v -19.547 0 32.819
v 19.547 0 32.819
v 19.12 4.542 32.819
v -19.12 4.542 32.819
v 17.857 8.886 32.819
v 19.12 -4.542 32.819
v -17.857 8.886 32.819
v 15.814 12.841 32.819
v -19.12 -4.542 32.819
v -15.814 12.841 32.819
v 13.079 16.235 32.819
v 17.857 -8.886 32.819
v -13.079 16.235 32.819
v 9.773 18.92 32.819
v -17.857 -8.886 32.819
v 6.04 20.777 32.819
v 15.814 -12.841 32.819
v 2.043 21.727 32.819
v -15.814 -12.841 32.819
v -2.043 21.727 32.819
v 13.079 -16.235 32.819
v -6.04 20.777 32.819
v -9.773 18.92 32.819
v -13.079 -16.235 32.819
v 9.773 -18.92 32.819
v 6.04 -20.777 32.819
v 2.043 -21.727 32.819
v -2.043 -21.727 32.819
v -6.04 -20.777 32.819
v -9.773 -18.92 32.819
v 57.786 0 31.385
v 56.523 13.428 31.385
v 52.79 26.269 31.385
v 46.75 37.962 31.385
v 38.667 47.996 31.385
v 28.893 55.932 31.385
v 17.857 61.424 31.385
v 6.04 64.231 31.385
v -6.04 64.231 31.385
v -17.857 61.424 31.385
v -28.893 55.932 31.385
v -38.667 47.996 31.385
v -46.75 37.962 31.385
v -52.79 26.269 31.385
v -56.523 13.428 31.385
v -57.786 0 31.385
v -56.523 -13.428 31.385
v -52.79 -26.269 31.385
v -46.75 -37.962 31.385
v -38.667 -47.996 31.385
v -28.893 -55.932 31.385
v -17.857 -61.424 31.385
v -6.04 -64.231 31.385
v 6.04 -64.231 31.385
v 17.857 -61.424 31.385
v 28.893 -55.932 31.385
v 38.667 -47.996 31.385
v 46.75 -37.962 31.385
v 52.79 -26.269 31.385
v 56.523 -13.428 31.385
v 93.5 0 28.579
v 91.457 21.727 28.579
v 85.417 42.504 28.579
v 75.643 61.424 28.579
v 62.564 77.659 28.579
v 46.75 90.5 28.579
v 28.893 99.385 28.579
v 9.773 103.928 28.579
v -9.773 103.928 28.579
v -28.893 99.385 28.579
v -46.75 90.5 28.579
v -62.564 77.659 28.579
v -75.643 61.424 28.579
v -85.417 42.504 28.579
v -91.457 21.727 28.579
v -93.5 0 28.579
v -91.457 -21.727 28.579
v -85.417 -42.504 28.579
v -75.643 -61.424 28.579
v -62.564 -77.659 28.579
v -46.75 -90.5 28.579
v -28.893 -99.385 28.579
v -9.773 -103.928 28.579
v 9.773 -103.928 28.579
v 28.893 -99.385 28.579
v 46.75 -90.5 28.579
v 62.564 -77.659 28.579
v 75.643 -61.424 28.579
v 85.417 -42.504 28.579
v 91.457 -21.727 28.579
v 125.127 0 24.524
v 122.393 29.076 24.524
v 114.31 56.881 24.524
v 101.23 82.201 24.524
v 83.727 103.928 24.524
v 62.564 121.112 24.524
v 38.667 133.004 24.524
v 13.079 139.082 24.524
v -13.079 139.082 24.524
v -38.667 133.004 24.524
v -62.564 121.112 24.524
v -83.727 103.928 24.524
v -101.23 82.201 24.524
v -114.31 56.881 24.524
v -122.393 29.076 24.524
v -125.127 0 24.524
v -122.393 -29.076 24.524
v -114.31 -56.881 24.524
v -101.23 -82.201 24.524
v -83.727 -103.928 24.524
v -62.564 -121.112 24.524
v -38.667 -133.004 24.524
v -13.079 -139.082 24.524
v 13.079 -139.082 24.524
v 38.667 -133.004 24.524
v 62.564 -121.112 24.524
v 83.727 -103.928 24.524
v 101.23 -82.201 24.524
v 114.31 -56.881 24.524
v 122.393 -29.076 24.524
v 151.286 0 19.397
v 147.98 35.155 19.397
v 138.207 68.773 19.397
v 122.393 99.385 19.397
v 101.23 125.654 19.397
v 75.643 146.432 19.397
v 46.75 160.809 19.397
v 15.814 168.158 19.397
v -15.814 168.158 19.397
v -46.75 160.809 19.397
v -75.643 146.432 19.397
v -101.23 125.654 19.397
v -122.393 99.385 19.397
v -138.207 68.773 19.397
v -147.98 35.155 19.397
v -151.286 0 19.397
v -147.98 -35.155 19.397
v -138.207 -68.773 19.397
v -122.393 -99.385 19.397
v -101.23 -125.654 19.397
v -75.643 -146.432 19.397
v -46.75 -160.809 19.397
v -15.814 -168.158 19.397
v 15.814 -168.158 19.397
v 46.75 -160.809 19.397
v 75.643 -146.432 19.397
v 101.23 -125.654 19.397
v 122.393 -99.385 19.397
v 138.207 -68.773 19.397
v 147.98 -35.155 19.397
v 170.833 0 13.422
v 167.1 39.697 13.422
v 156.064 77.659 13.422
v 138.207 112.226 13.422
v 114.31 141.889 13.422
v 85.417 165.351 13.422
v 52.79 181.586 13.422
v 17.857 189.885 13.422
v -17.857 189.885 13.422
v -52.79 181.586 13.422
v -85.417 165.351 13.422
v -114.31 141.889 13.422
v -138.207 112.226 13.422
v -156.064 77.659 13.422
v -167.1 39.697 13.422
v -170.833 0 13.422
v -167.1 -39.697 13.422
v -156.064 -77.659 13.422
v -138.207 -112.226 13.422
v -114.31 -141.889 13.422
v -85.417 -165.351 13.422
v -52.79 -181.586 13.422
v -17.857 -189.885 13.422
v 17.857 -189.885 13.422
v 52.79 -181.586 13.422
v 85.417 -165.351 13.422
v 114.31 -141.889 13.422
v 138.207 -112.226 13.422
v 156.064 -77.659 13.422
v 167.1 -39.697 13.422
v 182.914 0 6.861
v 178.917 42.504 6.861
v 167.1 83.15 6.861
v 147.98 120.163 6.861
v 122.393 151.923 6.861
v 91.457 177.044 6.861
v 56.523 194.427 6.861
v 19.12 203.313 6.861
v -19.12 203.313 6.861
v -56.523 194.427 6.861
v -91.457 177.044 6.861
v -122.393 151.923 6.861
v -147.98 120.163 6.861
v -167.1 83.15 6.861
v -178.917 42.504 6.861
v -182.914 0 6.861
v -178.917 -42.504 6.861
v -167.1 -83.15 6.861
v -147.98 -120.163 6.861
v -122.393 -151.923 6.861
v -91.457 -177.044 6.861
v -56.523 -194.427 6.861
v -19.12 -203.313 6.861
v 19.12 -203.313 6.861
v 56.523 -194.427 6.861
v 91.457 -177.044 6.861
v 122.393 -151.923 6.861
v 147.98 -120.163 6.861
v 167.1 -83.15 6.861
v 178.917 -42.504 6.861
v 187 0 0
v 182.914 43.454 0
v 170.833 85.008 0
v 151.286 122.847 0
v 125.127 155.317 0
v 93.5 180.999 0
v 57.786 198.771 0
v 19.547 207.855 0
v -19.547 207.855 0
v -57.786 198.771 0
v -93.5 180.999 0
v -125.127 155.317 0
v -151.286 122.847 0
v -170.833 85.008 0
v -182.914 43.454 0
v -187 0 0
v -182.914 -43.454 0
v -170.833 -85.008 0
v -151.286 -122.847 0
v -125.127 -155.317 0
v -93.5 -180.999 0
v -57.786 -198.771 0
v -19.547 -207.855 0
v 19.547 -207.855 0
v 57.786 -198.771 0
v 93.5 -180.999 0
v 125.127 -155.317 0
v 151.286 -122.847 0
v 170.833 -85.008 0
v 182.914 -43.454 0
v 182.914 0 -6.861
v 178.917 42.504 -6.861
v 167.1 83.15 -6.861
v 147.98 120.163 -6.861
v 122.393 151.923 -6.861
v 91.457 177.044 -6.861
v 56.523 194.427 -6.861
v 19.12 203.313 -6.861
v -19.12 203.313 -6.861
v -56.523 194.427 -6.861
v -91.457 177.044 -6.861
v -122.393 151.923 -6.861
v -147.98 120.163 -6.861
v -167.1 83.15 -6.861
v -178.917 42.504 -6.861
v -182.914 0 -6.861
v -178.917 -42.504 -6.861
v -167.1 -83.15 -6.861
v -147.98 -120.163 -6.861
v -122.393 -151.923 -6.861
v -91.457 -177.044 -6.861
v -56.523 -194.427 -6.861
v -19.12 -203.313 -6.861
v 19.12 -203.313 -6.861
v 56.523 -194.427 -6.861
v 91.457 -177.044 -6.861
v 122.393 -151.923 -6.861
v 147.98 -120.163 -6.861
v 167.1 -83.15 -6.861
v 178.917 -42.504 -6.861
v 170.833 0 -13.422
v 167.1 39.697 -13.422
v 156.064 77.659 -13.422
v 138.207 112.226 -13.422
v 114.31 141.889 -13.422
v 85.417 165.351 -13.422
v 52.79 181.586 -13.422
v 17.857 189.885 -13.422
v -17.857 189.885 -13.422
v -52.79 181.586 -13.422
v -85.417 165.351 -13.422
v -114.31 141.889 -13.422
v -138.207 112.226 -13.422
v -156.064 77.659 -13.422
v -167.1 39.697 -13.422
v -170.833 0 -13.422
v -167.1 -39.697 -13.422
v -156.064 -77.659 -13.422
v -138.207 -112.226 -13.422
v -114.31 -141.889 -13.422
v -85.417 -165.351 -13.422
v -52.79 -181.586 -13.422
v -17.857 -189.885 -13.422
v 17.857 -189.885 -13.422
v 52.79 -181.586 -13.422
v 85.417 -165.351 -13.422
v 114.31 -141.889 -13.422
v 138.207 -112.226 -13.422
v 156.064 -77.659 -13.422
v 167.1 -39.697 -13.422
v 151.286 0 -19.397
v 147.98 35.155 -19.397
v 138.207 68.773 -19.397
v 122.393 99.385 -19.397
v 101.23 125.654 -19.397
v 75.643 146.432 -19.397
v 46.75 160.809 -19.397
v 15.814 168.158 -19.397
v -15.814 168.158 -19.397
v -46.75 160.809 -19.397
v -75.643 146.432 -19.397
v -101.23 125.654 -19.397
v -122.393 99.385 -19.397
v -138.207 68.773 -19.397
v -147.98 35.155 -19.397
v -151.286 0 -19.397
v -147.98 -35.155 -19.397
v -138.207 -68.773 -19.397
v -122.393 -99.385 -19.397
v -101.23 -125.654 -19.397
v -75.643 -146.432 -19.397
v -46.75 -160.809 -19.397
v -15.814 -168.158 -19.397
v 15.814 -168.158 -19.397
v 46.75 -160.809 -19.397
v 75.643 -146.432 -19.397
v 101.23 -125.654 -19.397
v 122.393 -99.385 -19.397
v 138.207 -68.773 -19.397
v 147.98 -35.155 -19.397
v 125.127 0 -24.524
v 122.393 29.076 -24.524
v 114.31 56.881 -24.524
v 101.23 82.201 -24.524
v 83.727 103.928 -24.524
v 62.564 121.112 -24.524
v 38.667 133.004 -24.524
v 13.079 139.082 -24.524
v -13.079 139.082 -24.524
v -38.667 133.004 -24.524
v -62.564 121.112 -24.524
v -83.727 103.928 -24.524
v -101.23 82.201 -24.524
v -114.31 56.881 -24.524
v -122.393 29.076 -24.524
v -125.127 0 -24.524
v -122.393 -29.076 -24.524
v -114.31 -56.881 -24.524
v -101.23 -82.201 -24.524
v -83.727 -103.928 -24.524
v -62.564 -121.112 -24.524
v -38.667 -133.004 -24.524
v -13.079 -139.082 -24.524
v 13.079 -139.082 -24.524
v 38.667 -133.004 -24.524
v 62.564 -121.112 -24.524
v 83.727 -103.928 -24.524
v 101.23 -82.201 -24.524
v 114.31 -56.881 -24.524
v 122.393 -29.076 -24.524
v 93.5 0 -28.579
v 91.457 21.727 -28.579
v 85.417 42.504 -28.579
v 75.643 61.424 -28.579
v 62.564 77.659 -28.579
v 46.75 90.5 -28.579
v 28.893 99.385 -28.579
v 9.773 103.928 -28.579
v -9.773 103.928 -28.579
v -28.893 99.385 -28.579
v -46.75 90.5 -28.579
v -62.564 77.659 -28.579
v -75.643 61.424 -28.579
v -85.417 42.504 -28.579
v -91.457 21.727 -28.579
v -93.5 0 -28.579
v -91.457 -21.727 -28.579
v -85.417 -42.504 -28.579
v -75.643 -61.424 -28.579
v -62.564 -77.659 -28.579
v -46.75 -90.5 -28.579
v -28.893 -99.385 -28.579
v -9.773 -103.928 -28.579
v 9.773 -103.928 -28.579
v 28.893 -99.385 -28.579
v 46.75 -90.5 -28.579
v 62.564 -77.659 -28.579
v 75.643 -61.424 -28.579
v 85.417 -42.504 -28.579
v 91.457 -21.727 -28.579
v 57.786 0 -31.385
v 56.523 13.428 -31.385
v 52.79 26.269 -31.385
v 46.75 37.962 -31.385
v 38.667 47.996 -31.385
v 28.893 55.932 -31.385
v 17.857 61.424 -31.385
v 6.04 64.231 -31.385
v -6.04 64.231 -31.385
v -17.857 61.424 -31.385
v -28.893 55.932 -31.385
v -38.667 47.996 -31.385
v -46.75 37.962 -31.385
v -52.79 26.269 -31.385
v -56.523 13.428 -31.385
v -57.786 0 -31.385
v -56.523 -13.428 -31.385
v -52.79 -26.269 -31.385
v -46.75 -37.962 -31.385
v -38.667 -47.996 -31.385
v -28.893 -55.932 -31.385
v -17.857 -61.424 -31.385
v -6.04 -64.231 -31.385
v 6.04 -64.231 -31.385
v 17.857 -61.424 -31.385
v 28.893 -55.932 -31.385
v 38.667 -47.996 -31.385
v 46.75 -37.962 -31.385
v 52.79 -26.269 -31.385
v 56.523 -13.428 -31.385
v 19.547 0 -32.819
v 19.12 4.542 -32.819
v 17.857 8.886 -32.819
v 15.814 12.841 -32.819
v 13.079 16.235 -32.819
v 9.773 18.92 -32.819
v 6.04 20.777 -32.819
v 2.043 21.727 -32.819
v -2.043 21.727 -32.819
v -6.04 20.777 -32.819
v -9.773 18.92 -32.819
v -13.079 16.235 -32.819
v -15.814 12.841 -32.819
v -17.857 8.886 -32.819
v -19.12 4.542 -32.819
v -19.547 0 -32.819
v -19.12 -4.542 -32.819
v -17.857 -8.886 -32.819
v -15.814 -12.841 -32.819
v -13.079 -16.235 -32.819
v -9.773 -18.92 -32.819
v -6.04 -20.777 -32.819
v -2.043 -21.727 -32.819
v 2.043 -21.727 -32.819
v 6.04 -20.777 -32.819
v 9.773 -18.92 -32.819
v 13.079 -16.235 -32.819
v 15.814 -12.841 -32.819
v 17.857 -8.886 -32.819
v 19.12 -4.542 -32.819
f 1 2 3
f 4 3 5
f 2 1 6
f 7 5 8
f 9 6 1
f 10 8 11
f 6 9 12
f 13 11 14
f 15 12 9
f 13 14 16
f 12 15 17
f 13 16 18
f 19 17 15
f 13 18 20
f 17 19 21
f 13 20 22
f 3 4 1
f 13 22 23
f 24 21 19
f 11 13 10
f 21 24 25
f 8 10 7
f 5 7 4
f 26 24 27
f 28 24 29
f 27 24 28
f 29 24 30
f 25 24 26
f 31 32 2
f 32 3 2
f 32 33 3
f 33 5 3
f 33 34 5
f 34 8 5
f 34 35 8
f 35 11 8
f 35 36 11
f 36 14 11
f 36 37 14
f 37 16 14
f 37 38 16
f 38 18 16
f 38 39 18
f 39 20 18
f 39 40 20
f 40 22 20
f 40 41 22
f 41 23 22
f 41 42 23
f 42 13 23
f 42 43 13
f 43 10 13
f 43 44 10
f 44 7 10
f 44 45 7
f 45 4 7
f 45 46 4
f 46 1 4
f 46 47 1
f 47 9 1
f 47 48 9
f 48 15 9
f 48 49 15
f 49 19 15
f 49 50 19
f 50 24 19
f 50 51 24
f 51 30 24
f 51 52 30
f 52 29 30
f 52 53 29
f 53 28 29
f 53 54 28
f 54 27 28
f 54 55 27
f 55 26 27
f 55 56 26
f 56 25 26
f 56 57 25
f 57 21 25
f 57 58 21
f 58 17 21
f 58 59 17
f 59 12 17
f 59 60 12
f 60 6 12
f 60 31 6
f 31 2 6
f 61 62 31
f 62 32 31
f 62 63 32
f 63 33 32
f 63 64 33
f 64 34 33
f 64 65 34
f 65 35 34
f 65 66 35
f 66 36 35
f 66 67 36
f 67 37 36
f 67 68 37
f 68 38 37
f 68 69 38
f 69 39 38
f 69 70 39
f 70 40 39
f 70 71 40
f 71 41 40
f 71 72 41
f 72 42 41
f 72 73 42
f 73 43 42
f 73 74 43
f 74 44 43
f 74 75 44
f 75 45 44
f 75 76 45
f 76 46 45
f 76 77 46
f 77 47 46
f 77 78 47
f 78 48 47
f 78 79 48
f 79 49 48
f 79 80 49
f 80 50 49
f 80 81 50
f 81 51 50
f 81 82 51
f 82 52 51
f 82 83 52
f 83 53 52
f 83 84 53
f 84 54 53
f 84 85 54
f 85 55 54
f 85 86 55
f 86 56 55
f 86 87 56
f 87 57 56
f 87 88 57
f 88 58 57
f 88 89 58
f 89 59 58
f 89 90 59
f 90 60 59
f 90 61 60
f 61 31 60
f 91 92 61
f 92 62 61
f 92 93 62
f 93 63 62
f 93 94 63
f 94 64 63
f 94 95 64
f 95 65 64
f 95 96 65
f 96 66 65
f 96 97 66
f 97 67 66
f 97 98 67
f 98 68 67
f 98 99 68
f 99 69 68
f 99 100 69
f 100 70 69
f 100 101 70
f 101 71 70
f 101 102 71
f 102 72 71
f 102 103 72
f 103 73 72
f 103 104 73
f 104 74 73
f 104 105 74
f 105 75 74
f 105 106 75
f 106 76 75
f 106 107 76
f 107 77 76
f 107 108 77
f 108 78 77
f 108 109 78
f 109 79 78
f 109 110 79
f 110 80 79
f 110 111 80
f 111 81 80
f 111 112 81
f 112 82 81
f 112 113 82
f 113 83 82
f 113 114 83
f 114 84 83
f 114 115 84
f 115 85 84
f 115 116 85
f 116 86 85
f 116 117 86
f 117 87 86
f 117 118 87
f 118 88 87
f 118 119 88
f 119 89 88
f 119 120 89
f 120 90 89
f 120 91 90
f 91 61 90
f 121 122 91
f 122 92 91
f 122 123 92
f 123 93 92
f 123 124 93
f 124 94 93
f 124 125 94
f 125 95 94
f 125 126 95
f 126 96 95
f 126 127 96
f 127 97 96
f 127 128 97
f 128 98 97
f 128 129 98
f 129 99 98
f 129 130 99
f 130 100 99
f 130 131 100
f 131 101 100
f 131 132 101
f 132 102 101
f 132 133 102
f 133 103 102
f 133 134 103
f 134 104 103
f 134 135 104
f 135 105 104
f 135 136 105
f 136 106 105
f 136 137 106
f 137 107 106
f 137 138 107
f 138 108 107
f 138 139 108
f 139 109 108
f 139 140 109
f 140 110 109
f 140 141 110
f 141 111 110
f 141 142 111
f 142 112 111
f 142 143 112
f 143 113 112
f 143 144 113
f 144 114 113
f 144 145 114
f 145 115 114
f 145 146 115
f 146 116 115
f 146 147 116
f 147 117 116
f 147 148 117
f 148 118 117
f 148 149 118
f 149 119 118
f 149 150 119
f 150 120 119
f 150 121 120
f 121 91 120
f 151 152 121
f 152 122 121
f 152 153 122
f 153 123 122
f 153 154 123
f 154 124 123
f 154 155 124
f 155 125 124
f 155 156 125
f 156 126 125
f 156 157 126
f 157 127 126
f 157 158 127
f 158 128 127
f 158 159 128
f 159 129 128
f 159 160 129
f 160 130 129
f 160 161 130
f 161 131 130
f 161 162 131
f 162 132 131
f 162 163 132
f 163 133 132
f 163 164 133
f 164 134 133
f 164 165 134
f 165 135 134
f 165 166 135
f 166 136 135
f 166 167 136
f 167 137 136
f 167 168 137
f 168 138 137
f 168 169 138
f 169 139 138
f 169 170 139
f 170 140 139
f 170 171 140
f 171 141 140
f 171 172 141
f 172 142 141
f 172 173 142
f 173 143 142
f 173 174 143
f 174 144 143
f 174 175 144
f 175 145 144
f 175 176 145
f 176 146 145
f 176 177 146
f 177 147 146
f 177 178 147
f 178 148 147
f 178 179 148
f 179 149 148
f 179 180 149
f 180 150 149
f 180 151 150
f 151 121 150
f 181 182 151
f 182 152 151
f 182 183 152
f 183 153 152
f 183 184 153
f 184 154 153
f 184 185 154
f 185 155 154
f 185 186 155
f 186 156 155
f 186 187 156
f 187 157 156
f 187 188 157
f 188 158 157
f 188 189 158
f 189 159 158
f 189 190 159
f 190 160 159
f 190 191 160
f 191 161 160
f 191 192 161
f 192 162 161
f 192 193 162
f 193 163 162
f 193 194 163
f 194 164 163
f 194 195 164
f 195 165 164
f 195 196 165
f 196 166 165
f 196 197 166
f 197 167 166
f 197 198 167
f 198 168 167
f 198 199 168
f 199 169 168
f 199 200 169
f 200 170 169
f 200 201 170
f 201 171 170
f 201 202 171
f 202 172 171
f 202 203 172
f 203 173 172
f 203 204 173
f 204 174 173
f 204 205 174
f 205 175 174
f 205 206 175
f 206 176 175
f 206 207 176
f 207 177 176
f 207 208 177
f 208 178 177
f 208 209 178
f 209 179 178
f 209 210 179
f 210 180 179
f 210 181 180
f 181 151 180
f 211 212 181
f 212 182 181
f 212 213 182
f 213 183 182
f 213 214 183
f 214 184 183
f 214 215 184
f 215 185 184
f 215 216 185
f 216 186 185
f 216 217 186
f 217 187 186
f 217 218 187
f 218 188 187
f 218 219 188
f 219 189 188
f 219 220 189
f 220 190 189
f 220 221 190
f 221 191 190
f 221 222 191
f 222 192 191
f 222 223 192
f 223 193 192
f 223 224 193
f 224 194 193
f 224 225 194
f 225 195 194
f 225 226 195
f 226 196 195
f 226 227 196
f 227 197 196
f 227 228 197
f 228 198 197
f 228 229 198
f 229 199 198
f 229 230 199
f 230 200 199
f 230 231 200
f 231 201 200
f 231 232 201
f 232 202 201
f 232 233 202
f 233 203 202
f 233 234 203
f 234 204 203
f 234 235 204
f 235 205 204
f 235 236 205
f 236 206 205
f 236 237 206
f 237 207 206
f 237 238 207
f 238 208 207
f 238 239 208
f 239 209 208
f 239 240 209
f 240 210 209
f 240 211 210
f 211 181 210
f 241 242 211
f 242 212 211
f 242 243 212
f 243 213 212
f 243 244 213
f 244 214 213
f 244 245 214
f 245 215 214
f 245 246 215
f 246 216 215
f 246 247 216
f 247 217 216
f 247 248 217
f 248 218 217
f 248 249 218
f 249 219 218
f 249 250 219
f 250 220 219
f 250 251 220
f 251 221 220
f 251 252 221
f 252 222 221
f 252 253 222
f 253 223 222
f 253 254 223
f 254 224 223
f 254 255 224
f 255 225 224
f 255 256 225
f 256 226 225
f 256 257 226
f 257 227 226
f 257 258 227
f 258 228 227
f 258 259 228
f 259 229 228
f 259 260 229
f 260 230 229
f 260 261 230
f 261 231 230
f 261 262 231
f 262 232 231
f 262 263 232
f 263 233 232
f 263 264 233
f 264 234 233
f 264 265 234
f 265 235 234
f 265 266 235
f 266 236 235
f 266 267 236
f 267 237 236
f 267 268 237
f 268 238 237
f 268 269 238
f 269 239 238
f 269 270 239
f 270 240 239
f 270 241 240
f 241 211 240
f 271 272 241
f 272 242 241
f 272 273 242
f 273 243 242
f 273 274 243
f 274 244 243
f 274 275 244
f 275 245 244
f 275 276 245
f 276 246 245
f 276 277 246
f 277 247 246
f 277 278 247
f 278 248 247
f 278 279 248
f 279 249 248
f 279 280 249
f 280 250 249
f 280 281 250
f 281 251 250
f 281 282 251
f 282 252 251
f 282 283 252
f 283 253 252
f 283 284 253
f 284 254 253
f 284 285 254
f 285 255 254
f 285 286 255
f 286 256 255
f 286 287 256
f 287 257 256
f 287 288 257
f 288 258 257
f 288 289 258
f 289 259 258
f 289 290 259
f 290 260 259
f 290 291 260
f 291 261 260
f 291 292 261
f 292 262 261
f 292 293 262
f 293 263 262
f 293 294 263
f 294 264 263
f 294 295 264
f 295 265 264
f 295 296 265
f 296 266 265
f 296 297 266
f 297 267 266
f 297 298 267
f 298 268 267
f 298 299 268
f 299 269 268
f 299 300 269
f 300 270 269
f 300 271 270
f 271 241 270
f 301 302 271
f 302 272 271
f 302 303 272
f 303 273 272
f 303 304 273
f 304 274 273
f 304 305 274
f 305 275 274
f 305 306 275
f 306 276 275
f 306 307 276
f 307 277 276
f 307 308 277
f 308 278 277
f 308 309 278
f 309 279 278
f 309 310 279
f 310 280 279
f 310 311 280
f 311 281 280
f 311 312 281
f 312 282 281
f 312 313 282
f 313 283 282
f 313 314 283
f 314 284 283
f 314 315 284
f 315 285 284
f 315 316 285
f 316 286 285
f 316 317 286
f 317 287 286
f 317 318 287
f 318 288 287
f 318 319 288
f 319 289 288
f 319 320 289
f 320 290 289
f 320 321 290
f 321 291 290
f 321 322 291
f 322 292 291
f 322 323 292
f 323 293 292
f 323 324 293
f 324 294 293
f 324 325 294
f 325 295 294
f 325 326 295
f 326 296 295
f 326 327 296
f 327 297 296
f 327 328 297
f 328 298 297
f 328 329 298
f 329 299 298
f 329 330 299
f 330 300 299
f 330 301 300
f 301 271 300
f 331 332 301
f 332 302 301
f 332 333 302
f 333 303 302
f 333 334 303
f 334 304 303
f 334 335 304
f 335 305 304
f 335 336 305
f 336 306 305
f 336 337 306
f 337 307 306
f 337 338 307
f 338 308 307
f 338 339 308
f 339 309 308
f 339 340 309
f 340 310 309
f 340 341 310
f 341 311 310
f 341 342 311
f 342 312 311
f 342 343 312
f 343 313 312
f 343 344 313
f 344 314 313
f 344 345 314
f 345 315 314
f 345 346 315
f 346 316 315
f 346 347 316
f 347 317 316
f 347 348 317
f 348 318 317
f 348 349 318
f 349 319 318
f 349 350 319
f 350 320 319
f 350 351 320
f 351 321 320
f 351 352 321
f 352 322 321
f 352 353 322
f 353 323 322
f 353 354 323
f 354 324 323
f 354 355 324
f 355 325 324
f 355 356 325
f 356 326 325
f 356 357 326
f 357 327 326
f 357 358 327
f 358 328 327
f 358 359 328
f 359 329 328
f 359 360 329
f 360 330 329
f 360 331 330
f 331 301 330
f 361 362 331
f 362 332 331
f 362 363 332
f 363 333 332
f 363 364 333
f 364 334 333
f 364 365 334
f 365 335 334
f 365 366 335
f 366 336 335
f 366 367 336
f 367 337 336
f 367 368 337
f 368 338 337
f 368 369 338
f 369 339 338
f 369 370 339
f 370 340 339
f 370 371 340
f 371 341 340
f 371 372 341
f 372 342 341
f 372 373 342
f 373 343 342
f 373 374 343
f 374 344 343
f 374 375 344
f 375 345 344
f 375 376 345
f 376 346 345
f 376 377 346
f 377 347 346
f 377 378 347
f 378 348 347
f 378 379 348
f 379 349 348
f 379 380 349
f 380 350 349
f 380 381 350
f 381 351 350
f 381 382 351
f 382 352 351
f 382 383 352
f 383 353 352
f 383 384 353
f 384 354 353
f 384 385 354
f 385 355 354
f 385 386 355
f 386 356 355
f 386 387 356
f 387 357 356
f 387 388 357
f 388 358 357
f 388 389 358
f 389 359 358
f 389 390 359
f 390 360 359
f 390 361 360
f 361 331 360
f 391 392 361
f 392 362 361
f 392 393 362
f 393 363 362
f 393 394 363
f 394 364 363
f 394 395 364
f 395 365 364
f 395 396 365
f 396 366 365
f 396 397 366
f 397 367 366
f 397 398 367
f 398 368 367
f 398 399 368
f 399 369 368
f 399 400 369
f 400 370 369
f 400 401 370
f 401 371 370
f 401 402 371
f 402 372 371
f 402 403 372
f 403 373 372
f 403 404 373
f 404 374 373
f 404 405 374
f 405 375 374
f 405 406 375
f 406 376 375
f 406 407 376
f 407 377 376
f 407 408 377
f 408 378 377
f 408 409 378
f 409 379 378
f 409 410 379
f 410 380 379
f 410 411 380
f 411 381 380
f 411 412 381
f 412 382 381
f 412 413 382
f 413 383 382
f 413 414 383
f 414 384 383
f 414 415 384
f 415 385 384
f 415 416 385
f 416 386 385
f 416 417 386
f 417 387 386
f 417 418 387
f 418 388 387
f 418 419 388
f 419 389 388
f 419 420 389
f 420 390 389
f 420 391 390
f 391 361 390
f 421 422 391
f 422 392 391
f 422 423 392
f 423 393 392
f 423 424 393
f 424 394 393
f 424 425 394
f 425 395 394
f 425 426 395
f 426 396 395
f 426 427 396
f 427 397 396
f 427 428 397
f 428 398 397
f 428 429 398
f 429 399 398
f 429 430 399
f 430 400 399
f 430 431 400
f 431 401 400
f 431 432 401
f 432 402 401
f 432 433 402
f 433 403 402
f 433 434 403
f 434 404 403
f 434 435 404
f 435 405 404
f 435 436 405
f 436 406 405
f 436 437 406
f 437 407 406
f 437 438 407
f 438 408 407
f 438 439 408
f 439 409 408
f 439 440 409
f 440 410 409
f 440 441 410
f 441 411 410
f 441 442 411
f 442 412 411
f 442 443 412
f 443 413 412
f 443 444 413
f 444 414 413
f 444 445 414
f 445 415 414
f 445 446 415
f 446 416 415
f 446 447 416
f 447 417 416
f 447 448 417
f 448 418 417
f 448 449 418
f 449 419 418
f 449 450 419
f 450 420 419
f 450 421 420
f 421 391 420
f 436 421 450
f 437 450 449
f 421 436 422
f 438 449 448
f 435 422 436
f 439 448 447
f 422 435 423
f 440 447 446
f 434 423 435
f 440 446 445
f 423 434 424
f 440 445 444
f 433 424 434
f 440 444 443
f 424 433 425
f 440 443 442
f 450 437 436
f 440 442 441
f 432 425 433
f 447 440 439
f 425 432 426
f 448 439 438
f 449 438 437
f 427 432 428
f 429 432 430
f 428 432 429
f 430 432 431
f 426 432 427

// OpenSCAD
// Generated by SolidPython 1.0.1 on 2020-07-29 00:46:53


scale(v = [17, 19, 3]) {
	sphere(r = 11);
}
/***********************************************
*********      SolidPython code:      **********
************************************************
 
# import packages: SolidPython
from solid import *
from solid.utils import *
from itertools import chain, combinations, permutations


class Resize:

    def __init__(self, scad_file):
        self.scad_file = scad_file
        #self.scad_file = import_scad(scad_file)
        # cone/cylinder param:
        self.r1 = 0
        self.r2 = 0
        self.h = 0
        # rectangular prism param:
        self.w = 0
        self.l = 0
        # ellipse param:
        self.r = 0

    # import OpenScad code (file name corresponds to shape)


    # classify shape + parameters
    def assign(self, param1, param2, param3):
        if self.scad_file == 'cone.scad':
            self.r1 = param1
            self.r2 = param2
            self.h = param3
        elif self.scad_file == 'cylinder.scad':
            self.r1 = param1
            self.r2 = param2
            self.h = param3
        elif self.scad_file == 'rectangularPrism.scad':
            self.h = param1
            self.l = param2
            self.w = param3
        else:
            self.r = param1
            self.h = param2

    # resize parameters
    def iterate(self):
        x = range(3, 20, 2)
        i = 1
        if self.scad_file == 'cone.scad':
            tempList = list(permutations(x, 2))
            for temp in tempList:
                param1 = temp[0]
                param2 = temp[1]
                filepath = 'produced_scad_files/' + 'cone' + str(param1) + '_' + str(param2) + '_' + '.scad'
                scad_render_to_file(cylinder(h=param1, r1=param2, r2=0), filepath)

        elif self.scad_file == 'cylinder.scad':
            tempList = list(permutations(x, 3))
            for temp in tempList:
                param1 = temp[0]
                param2 = temp[1]
                filepath = 'produced_scad_files/' + 'cylinder' + str(param1) + '_' + str(param2) + '_' + '.scad'
                scad_render_to_file(cylinder(h=param1, r1=param2, r2=param2), filepath)

        elif self.scad_file == 'rectangularPrism.scad':
            tempList = list(permutations(x, 3))
            for temp in tempList:
                param1 = temp[0]
                param2 = temp[1]
                param3 = temp[2]
                filepath = 'produced_scad_files/' + 'rectangularPrism' + str(param1) + '_' + str(param2) + '_' + str(
                    param3) + '.scad'
                scad_render_to_file(cube(size=(param1, param2, param3)), filepath)

        elif self.scad_file == 'ellipse.scad':
            tempList = list(permutations(x, 4))
            for temp in tempList:
                param1 = temp[0]
                param2 = temp[1]
                param3 = temp[2]
                param4 = temp[3]
                filepath = 'produced_scad_files/' + 'ellipse' + str(param1) + '_' + str(param2) + '_' + str(param3) + '_' + str(param4) + '.scad'
                scad_render_to_file(scale([param1, param2, param3])(sphere(r=param4)), filepath)

    def render_to_scadfile(self):
        scad_render_to_file(scad, 'example.scad') 
 
************************************************/
